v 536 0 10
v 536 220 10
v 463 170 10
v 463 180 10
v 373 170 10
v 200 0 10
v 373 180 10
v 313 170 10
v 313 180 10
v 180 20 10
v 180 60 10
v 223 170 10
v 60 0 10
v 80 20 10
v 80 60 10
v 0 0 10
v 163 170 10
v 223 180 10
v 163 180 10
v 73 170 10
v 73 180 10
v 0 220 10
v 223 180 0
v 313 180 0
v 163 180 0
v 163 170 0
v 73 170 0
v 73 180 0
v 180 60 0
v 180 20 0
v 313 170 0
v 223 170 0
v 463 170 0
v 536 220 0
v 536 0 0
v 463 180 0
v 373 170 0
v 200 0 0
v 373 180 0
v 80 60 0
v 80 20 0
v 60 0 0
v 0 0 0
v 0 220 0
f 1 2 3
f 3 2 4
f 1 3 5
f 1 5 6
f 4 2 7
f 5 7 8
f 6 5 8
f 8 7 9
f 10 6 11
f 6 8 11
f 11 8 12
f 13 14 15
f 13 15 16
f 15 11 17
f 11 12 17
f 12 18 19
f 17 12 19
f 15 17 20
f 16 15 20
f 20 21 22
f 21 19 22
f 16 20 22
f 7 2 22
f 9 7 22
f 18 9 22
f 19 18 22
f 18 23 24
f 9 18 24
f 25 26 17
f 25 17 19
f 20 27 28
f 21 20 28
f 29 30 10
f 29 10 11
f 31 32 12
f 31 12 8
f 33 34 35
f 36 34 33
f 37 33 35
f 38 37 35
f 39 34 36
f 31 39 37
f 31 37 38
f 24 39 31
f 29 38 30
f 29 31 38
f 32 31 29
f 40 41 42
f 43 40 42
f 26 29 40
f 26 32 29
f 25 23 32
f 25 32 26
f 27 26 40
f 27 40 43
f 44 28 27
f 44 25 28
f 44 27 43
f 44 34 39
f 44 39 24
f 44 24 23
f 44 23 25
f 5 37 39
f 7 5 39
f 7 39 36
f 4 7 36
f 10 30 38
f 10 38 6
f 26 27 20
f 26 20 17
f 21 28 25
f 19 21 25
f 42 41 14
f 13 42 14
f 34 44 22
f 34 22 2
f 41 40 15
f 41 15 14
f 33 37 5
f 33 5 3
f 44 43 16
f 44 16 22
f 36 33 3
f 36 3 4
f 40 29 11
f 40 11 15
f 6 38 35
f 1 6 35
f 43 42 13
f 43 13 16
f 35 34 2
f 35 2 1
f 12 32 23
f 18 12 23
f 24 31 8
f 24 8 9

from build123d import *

# Parameters (mm, degrees)
ESQUISSE1_W        = 90
ESQUISSE1_H        = 10
BOSS_EXTRU_1_DEPTH = 10
CHANFREIN1_SIZE    = 20


with BuildPart() as part:
    # Esquisse1 → Boss.-Extru.1 (new body)
    with BuildSketch(Plane.XY):
        Polygon((0, 220), (536, 220), (536, 0), (436, 0), (200, 0), (180, 0), (180, 60), (80, 60), (80, 0), (0, 0), align=None)
        with Locations((118, 175)):
            Rectangle(ESQUISSE1_W, ESQUISSE1_H, mode=Mode.SUBTRACT)
        with Locations((268, 175)):
            Rectangle(ESQUISSE1_W, ESQUISSE1_H, mode=Mode.SUBTRACT)
        with Locations((418, 175)):
            Rectangle(ESQUISSE1_W, ESQUISSE1_H, mode=Mode.SUBTRACT)
    extrude(amount=BOSS_EXTRU_1_DEPTH)

    # Chanfrein1
    chanfrein1_edges = [part.edges().sort_by_distance(p)[0] for p in [
        (180, 0, 5),
        (80, 0, 5),
    ]]
    chamfer(chanfrein1_edges, length=CHANFREIN1_SIZE)


solid = part.part
